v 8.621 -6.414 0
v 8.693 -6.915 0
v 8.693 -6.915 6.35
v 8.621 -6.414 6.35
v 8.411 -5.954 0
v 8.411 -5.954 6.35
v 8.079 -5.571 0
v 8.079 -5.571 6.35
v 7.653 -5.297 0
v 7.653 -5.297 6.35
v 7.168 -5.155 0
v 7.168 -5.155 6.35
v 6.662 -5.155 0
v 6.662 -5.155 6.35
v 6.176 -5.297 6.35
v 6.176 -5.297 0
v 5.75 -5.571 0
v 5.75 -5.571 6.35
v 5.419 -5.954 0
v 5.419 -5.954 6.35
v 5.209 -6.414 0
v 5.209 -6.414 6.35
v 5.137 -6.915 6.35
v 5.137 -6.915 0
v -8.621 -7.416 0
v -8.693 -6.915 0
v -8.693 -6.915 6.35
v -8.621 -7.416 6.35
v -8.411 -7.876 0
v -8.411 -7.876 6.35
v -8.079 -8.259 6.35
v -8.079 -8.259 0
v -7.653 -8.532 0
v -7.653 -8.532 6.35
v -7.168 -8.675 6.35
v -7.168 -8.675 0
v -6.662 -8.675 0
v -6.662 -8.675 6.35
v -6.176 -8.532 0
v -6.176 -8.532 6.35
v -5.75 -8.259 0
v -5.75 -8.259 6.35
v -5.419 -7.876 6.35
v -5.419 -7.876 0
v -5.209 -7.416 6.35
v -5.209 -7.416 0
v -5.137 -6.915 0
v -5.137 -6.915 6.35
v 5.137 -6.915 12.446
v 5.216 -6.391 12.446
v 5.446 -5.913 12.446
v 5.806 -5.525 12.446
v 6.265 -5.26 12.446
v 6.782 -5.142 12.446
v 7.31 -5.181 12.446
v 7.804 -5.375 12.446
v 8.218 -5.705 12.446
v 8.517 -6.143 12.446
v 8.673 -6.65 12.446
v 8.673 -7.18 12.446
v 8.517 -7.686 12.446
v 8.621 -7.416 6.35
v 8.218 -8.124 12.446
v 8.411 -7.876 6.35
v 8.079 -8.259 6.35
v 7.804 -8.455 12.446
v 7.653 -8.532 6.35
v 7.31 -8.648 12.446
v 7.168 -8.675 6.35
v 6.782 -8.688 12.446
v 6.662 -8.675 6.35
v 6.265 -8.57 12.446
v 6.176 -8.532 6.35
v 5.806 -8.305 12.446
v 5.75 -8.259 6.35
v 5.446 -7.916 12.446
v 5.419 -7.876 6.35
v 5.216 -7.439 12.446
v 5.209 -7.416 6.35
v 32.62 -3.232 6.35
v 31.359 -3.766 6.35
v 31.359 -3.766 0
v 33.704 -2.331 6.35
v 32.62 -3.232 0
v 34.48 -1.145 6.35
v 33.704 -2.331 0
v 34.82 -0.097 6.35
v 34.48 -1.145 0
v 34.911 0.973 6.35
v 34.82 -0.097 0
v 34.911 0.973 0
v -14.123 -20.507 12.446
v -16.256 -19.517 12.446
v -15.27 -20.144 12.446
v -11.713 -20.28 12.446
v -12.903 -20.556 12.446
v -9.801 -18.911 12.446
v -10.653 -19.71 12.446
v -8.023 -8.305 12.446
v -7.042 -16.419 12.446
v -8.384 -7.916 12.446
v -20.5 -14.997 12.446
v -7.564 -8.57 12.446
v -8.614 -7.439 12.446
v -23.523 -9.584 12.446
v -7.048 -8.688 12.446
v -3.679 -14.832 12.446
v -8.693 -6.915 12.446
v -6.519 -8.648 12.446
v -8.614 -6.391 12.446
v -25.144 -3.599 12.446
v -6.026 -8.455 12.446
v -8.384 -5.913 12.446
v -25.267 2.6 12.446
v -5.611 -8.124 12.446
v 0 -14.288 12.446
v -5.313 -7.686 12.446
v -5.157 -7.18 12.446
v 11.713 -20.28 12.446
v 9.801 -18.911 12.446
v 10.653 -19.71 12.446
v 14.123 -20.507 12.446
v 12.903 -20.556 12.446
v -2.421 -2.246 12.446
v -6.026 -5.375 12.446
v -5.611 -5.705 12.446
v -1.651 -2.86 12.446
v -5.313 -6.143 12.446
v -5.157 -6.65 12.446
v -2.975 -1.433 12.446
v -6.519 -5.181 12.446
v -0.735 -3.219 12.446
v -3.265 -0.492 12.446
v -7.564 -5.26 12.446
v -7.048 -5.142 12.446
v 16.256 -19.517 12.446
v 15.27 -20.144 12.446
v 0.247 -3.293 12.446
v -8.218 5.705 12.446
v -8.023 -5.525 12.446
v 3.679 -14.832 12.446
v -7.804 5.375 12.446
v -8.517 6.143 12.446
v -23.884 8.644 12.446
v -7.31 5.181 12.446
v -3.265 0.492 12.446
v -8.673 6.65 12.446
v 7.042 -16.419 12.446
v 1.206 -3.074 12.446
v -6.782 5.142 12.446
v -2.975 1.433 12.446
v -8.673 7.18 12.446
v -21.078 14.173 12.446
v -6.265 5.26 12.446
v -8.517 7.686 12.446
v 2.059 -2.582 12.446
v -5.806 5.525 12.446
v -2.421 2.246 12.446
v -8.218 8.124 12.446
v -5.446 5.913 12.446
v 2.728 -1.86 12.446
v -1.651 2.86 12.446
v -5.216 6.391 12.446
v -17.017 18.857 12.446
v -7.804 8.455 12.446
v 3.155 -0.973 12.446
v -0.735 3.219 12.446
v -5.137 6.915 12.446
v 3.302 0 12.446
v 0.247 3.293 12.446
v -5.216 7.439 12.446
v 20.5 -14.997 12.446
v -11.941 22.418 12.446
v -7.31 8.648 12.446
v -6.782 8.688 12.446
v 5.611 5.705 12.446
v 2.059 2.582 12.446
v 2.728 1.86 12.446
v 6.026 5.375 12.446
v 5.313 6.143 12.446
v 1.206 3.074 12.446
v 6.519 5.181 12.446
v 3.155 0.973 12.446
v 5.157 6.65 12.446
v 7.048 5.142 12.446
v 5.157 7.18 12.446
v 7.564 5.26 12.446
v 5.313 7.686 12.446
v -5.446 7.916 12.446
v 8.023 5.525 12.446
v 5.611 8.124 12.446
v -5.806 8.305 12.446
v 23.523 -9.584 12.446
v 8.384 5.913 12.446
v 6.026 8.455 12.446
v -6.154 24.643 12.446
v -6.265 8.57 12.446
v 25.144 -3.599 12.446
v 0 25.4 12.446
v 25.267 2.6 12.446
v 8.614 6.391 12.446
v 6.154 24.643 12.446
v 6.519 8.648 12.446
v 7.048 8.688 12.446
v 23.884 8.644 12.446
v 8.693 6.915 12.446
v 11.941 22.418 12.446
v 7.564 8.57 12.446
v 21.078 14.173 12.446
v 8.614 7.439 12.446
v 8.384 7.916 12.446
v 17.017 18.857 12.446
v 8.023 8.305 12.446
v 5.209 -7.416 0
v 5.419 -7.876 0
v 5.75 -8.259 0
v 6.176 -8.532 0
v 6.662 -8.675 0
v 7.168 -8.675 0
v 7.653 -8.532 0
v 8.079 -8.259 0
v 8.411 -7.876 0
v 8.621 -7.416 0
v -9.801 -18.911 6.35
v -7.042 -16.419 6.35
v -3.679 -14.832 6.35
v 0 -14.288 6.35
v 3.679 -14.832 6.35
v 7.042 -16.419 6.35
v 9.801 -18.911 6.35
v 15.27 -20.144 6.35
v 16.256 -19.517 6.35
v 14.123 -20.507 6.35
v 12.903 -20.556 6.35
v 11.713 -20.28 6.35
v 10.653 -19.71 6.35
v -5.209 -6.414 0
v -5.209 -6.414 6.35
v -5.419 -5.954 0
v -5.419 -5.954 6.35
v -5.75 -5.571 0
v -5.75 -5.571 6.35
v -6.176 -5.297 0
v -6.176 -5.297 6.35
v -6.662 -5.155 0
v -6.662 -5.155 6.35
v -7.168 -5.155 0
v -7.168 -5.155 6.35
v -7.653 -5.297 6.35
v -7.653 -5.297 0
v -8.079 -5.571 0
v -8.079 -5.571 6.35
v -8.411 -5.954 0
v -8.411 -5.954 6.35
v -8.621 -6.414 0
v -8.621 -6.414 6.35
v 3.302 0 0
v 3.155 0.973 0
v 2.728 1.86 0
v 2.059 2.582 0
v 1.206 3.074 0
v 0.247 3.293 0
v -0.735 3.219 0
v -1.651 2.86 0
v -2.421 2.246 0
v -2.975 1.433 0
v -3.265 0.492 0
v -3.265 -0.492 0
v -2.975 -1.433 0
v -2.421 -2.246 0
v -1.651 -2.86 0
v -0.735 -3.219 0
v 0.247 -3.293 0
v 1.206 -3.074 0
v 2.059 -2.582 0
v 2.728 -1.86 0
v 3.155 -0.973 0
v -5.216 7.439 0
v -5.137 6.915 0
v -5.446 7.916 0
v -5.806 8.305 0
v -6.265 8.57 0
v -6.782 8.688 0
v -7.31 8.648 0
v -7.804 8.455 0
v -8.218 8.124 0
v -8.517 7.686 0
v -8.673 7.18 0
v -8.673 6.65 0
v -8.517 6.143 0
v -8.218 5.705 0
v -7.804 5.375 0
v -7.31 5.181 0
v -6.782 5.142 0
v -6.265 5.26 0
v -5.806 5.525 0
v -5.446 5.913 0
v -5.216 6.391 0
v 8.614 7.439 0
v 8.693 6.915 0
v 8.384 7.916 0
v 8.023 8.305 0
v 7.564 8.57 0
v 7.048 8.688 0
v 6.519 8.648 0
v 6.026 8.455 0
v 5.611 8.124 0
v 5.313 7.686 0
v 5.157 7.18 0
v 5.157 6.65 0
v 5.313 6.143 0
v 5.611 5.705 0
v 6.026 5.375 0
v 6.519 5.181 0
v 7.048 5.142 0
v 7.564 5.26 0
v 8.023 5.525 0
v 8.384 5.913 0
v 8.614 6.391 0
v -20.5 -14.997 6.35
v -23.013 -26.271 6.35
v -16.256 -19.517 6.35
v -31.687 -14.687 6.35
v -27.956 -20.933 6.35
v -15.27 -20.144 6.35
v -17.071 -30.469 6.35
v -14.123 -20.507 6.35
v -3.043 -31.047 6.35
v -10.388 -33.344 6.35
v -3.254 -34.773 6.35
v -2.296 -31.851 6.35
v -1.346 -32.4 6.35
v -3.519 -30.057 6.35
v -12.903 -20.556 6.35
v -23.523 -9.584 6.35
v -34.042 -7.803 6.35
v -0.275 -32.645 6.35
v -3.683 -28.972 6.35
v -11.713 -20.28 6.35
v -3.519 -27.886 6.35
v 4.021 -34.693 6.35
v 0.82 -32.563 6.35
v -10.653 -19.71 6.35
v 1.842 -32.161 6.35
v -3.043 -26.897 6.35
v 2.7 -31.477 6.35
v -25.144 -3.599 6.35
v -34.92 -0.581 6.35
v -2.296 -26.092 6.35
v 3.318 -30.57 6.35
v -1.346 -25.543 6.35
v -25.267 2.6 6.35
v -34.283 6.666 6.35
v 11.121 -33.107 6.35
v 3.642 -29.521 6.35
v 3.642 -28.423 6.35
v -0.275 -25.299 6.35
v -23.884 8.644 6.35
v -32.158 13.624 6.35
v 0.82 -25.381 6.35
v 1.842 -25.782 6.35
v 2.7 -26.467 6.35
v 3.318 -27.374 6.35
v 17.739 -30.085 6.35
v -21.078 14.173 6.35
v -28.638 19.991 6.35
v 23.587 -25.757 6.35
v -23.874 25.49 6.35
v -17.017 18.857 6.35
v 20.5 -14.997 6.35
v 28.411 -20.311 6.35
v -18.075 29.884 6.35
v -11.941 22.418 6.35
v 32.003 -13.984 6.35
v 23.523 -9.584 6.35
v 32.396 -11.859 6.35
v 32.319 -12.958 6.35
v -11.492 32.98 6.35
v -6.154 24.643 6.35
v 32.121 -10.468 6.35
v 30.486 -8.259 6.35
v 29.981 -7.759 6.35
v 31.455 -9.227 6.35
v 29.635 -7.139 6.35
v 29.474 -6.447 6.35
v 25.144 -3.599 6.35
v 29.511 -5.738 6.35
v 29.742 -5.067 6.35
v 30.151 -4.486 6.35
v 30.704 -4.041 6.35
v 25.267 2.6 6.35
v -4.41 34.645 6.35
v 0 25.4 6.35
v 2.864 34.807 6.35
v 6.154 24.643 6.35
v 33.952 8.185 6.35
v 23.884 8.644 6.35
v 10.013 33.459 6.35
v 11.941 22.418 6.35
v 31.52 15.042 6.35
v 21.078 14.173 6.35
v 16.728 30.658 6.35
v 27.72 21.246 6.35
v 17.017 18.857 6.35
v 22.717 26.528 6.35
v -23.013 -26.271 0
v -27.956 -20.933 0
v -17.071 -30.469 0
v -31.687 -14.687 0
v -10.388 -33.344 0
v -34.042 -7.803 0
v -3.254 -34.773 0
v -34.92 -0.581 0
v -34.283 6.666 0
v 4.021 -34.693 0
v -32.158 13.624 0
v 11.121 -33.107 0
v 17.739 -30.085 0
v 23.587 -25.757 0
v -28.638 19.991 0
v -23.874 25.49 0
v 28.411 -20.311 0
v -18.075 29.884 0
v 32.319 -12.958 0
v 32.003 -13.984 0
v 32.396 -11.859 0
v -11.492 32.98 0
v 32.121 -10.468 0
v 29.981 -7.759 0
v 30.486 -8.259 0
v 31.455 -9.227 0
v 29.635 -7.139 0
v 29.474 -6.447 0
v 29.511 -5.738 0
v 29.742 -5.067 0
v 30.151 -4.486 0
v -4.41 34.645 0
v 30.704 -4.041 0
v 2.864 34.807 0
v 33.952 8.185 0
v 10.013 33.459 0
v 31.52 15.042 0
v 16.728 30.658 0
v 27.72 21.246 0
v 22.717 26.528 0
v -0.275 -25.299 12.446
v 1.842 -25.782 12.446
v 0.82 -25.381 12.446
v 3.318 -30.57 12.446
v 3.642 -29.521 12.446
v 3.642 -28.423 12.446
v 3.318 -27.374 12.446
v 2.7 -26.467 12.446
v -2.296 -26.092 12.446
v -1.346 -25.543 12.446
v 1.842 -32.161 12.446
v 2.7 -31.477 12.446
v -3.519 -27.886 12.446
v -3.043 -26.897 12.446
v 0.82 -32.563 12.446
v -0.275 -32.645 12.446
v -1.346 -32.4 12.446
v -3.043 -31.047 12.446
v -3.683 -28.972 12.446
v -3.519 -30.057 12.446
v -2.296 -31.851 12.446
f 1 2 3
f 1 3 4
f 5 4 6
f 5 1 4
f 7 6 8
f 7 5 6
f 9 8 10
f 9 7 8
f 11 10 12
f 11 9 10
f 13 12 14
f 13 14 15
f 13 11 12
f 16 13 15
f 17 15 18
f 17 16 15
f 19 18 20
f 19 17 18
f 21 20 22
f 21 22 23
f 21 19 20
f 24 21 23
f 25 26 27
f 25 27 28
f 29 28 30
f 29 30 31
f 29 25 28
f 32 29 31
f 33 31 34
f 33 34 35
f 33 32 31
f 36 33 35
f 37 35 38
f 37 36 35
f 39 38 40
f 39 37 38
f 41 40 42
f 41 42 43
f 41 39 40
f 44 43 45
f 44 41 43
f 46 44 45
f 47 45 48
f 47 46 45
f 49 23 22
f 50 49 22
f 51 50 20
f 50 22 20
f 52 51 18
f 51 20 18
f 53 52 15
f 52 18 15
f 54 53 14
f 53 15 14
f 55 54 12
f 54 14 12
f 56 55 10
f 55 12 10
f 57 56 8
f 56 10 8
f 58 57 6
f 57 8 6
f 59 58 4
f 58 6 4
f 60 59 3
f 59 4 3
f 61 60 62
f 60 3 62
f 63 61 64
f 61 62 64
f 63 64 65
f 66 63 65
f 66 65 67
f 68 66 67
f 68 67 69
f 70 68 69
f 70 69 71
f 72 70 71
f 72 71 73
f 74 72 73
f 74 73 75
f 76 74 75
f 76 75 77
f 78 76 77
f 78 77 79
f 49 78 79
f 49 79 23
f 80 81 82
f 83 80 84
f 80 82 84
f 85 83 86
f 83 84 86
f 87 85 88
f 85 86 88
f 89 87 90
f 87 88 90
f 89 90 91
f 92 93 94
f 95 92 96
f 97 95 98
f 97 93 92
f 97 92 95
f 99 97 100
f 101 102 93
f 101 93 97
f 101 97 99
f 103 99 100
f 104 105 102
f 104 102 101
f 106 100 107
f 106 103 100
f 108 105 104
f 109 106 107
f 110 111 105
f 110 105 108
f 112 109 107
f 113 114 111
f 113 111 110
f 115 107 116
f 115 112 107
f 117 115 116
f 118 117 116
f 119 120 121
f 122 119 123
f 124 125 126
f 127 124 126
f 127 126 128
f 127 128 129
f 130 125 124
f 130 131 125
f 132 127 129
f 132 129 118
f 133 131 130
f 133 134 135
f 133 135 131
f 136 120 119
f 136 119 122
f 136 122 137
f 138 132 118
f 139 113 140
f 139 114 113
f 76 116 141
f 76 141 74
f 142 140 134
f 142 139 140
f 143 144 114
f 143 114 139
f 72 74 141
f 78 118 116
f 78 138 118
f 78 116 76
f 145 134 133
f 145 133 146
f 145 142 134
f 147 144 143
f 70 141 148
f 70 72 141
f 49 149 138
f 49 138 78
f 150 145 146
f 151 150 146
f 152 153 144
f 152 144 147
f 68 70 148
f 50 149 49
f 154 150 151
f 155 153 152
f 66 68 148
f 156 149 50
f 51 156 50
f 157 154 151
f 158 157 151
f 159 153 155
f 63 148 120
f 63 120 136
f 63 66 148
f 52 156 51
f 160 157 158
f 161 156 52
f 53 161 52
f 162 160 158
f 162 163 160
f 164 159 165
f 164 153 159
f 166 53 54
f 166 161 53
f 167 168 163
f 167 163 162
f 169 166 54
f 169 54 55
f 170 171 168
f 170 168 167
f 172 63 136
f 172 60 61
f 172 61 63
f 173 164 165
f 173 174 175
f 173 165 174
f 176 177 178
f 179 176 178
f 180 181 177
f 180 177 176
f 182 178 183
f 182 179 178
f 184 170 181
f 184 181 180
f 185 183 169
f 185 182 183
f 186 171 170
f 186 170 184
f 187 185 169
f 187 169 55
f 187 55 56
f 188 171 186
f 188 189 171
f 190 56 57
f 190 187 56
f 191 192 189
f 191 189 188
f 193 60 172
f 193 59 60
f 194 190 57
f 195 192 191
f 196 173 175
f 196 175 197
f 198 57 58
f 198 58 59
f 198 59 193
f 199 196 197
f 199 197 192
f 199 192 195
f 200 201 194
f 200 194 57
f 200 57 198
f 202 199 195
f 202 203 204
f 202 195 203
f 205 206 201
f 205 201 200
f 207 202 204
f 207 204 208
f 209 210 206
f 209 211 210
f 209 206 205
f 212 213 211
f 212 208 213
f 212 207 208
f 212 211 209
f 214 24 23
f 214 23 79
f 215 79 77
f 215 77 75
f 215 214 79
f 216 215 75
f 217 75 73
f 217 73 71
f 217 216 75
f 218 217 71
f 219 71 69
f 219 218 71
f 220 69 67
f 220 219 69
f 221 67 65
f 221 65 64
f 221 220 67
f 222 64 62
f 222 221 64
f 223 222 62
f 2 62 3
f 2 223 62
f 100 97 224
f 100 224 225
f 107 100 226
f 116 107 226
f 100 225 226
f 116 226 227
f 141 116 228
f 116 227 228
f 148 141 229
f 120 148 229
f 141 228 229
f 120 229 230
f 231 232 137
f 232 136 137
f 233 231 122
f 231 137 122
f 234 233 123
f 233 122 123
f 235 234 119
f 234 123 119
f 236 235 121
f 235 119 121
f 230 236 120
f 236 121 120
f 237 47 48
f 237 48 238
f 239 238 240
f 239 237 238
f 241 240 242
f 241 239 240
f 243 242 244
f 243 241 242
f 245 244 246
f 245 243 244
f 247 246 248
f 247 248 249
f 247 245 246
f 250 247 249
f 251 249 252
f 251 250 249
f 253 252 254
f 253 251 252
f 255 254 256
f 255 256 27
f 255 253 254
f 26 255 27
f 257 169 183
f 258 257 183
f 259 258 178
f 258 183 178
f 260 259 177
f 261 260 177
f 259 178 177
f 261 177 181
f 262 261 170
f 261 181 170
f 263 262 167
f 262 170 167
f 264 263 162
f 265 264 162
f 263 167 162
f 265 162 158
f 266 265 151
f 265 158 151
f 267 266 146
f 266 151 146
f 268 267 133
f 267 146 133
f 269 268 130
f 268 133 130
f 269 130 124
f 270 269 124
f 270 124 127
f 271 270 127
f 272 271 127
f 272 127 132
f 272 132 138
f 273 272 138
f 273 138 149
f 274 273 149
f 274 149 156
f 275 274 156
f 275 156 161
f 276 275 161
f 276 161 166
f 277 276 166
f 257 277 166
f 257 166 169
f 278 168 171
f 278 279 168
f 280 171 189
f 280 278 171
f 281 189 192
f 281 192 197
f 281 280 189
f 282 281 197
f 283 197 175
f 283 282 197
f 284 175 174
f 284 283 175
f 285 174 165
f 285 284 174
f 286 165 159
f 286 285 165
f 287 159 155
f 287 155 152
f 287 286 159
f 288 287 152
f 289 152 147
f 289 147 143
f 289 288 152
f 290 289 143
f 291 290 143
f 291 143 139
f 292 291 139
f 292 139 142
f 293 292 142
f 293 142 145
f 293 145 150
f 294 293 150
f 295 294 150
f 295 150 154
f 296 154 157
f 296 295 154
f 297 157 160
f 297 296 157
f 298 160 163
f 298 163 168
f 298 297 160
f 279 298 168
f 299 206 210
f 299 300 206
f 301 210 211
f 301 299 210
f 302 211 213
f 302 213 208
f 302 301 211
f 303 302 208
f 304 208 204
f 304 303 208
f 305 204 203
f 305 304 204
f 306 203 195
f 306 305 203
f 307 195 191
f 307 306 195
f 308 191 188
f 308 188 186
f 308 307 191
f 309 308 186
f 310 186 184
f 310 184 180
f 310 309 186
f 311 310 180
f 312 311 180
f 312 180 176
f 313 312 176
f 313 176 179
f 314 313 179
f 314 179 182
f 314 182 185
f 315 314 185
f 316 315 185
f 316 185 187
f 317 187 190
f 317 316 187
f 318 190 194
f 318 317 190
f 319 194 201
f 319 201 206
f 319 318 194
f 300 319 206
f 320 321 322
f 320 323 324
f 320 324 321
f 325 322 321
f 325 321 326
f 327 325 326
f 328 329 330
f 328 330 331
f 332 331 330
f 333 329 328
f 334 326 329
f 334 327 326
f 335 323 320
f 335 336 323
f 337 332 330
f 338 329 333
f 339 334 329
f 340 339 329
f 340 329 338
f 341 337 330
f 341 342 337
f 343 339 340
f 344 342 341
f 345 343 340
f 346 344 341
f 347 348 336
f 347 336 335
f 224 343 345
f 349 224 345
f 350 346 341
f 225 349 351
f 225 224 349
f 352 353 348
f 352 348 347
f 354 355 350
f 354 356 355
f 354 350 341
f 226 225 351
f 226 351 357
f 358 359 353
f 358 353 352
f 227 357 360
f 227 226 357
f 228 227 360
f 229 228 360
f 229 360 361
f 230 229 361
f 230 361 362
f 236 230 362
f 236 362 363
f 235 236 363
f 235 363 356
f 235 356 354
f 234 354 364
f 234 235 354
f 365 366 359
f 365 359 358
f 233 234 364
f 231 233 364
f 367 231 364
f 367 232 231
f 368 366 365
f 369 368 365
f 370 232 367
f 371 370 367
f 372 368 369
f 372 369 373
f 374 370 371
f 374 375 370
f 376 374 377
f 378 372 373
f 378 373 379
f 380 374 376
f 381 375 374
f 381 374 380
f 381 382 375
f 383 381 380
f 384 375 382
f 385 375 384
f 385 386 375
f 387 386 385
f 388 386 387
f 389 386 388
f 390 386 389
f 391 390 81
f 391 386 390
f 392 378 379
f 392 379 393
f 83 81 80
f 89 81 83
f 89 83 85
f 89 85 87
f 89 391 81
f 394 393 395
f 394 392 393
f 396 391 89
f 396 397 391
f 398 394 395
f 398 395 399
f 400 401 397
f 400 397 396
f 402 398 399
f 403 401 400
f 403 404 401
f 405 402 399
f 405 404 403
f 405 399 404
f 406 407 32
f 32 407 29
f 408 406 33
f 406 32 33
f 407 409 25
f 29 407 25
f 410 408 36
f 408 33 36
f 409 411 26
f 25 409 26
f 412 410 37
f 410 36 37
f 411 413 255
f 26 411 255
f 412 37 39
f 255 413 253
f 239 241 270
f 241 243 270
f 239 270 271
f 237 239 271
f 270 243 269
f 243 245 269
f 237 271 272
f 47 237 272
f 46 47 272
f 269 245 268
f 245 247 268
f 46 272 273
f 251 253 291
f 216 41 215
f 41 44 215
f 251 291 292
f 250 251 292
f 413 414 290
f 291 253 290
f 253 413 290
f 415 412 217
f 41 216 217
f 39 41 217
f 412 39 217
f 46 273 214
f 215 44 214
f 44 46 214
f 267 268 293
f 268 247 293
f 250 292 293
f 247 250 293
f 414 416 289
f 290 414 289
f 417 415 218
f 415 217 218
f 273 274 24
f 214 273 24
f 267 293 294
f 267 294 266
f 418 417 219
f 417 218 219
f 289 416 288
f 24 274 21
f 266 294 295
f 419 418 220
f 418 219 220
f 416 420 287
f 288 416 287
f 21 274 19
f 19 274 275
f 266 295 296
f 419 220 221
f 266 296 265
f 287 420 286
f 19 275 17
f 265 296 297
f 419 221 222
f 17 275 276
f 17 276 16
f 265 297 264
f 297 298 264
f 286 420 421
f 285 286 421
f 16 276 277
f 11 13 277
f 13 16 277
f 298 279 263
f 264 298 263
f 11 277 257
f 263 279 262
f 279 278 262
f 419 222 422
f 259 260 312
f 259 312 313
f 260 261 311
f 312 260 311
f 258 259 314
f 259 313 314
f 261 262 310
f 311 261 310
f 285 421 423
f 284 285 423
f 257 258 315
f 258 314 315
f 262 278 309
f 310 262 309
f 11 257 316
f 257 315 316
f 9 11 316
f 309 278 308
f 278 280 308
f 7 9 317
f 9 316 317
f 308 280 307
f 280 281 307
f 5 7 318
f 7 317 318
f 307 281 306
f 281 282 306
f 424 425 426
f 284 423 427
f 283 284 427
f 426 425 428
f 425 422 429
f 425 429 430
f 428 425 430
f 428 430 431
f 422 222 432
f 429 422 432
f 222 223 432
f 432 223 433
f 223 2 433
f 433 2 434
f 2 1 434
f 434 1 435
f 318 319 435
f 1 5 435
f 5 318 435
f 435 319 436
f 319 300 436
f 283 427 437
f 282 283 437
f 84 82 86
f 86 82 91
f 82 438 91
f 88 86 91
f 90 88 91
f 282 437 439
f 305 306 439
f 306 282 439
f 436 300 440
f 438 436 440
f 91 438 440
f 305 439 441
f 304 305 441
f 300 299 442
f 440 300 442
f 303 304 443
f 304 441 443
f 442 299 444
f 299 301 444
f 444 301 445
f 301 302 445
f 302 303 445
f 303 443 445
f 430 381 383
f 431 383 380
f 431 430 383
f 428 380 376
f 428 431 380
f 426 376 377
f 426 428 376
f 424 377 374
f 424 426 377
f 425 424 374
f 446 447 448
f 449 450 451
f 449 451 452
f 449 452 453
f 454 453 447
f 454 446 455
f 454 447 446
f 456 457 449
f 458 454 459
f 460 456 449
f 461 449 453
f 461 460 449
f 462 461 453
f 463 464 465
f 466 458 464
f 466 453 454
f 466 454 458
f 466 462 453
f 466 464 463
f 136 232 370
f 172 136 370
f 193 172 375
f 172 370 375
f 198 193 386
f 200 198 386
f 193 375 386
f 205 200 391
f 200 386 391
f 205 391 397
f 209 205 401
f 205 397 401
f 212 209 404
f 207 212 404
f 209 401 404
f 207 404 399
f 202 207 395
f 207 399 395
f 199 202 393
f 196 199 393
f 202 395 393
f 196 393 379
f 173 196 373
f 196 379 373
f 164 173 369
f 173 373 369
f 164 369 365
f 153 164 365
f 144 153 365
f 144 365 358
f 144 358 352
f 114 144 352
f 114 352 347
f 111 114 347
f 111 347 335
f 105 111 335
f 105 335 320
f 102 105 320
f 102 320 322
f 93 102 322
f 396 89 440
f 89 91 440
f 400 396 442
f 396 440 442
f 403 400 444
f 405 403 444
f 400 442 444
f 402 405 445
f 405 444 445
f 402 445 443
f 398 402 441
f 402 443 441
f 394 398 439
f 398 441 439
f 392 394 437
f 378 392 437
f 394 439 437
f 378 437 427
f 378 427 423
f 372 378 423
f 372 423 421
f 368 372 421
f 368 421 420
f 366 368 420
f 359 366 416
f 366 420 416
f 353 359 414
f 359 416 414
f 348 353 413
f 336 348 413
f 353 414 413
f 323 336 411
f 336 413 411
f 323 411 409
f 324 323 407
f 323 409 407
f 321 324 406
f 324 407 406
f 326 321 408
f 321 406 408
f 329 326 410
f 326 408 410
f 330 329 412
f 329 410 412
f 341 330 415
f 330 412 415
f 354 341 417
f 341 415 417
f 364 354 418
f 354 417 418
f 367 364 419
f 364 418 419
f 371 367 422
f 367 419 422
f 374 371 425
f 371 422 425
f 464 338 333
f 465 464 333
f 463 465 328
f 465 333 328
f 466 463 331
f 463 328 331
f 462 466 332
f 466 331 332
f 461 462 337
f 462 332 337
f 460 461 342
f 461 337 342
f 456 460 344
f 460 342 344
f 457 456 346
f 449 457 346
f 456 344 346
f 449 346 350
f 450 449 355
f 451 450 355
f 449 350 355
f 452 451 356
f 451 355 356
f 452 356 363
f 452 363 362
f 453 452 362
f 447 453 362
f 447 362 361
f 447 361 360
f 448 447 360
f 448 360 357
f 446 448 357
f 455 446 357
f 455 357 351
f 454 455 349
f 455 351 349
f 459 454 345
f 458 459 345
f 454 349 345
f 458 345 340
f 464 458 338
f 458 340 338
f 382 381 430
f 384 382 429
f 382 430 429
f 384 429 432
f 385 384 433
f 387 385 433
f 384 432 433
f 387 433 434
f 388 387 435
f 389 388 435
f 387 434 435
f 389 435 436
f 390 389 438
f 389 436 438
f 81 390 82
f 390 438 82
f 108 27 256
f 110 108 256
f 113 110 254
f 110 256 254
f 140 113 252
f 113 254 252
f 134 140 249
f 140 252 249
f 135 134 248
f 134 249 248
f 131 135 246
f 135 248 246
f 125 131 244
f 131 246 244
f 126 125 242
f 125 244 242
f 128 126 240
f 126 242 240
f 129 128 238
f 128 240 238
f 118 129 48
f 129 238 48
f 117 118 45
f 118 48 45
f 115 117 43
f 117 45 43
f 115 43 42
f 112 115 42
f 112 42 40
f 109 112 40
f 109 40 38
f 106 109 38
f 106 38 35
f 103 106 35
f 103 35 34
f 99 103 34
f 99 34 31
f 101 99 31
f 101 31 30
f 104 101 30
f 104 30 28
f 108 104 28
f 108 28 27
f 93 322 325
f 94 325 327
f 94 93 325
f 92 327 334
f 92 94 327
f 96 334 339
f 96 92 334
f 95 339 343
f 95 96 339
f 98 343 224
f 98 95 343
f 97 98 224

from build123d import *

# Parameters (mm, degrees)
SKETCH1_R           = 34.925
SKETCH1_R_2         = 1.778
BOSS_EXTRUDE1_DEPTH = 6.35
SKETCH2_R           = 3.683
SKETCH2_R_2         = 1.778
BOSS_EXTRUDE2_DEPTH = 6.096
SKETCH3_R           = 3.302
CUT_EXTRUDE1_DEPTH  = 51.935392077
FILLET1_R           = 4.572
SKETCH4_R           = 1.778
CUT_EXTRUDE2_DEPTH  = 51.935392238
SKETCH5_R           = 2.54
CUT_EXTRUDE3_DEPTH  = 51.935392238
FILLET2_R           = 4.7625


with BuildPart() as part:
    # Sketch1 → Boss-Extrude1 (new body)
    with BuildSketch(Plane.XY):
        Circle(SKETCH1_R)
        with Locations((-6.914797213, 6.914797213)):
            Circle(SKETCH1_R_2, mode=Mode.SUBTRACT)
        with Locations((6.914797213, 6.914797213)):
            Circle(SKETCH1_R_2, mode=Mode.SUBTRACT)
        with Locations((6.914797213, -6.914797213)):
            Circle(SKETCH1_R_2, mode=Mode.SUBTRACT)
        with Locations((-6.914797213, -6.914797213)):
            Circle(SKETCH1_R_2, mode=Mode.SUBTRACT)
    extrude(amount=BOSS_EXTRUDE1_DEPTH)

    # Sketch2 → Boss-Extrude2 (add)
    # profile 1 of 2: a face of its own
    with BuildSketch(Plane.XY.offset(6.35)):
        with Locations(Location((0, -28.971875, 0), (0, 0, 180))):
            Circle(SKETCH2_R)
    # profile 2 of 2: a face of its own
    with BuildSketch(Plane.XY.offset(6.35)):
        with BuildLine():
            ThreePointArc((11.864980378, -22.458455882), (0, 25.4), (-11.864980378, -22.458455882))
            ThreePointArc((-11.864980378, -22.458455882), (0, -14.2875), (11.864980378, -22.458455882))
        make_face()
        with Locations((-6.914797213, 6.914797213)):
            Circle(SKETCH2_R_2, mode=Mode.SUBTRACT)
        with Locations((6.914797213, 6.914797213)):
            Circle(SKETCH2_R_2, mode=Mode.SUBTRACT)
    extrude(amount=BOSS_EXTRUDE2_DEPTH)

    # Sketch3 → Cut-Extrude1 (cut, through all)
    with BuildSketch(Plane.XY.offset(12.446)):
        Circle(SKETCH3_R)
    extrude(amount=-CUT_EXTRUDE1_DEPTH, mode=Mode.SUBTRACT)

    # Fillet1
    fillet1_edges = [part.edges().sort_by_distance(p)[0] for p in [
        (-11.864980378, -22.458455882, 9.398),
        (11.864980378, -22.458455882, 9.398),
    ]]
    fillet(fillet1_edges, radius=FILLET1_R)

    # Sketch4 → Cut-Extrude2 (cut, through all)
    with BuildSketch(Plane(origin=(0, 0, 0), x_dir=(-1, 0, 0), z_dir=(0, 0, -1))):
        with Locations((-6.914797213, -6.914797213)):
            Circle(SKETCH4_R)
        with Locations((6.914797213, -6.914797213)):
            Circle(SKETCH4_R)
    extrude(amount=-CUT_EXTRUDE2_DEPTH, mode=Mode.SUBTRACT)

    # Sketch5 → Cut-Extrude3 (cut, through all)
    with BuildSketch(Plane(origin=(0, 0, 0), x_dir=(-1, 0, 0), z_dir=(0, 0, -1))):
        with Locations((-32.004, -6.223)):
            Circle(SKETCH5_R)
    extrude(amount=-CUT_EXTRUDE3_DEPTH, mode=Mode.SUBTRACT)

    # Fillet2
    fillet2_edges = [part.edges().sort_by_distance(p)[0] for p in [
        (34.470468913, -5.616261917, 3.175),
        (34.06339832, -7.709767823, 3.175),
    ]]
    fillet(fillet2_edges, radius=FILLET2_R)


solid = part.part
